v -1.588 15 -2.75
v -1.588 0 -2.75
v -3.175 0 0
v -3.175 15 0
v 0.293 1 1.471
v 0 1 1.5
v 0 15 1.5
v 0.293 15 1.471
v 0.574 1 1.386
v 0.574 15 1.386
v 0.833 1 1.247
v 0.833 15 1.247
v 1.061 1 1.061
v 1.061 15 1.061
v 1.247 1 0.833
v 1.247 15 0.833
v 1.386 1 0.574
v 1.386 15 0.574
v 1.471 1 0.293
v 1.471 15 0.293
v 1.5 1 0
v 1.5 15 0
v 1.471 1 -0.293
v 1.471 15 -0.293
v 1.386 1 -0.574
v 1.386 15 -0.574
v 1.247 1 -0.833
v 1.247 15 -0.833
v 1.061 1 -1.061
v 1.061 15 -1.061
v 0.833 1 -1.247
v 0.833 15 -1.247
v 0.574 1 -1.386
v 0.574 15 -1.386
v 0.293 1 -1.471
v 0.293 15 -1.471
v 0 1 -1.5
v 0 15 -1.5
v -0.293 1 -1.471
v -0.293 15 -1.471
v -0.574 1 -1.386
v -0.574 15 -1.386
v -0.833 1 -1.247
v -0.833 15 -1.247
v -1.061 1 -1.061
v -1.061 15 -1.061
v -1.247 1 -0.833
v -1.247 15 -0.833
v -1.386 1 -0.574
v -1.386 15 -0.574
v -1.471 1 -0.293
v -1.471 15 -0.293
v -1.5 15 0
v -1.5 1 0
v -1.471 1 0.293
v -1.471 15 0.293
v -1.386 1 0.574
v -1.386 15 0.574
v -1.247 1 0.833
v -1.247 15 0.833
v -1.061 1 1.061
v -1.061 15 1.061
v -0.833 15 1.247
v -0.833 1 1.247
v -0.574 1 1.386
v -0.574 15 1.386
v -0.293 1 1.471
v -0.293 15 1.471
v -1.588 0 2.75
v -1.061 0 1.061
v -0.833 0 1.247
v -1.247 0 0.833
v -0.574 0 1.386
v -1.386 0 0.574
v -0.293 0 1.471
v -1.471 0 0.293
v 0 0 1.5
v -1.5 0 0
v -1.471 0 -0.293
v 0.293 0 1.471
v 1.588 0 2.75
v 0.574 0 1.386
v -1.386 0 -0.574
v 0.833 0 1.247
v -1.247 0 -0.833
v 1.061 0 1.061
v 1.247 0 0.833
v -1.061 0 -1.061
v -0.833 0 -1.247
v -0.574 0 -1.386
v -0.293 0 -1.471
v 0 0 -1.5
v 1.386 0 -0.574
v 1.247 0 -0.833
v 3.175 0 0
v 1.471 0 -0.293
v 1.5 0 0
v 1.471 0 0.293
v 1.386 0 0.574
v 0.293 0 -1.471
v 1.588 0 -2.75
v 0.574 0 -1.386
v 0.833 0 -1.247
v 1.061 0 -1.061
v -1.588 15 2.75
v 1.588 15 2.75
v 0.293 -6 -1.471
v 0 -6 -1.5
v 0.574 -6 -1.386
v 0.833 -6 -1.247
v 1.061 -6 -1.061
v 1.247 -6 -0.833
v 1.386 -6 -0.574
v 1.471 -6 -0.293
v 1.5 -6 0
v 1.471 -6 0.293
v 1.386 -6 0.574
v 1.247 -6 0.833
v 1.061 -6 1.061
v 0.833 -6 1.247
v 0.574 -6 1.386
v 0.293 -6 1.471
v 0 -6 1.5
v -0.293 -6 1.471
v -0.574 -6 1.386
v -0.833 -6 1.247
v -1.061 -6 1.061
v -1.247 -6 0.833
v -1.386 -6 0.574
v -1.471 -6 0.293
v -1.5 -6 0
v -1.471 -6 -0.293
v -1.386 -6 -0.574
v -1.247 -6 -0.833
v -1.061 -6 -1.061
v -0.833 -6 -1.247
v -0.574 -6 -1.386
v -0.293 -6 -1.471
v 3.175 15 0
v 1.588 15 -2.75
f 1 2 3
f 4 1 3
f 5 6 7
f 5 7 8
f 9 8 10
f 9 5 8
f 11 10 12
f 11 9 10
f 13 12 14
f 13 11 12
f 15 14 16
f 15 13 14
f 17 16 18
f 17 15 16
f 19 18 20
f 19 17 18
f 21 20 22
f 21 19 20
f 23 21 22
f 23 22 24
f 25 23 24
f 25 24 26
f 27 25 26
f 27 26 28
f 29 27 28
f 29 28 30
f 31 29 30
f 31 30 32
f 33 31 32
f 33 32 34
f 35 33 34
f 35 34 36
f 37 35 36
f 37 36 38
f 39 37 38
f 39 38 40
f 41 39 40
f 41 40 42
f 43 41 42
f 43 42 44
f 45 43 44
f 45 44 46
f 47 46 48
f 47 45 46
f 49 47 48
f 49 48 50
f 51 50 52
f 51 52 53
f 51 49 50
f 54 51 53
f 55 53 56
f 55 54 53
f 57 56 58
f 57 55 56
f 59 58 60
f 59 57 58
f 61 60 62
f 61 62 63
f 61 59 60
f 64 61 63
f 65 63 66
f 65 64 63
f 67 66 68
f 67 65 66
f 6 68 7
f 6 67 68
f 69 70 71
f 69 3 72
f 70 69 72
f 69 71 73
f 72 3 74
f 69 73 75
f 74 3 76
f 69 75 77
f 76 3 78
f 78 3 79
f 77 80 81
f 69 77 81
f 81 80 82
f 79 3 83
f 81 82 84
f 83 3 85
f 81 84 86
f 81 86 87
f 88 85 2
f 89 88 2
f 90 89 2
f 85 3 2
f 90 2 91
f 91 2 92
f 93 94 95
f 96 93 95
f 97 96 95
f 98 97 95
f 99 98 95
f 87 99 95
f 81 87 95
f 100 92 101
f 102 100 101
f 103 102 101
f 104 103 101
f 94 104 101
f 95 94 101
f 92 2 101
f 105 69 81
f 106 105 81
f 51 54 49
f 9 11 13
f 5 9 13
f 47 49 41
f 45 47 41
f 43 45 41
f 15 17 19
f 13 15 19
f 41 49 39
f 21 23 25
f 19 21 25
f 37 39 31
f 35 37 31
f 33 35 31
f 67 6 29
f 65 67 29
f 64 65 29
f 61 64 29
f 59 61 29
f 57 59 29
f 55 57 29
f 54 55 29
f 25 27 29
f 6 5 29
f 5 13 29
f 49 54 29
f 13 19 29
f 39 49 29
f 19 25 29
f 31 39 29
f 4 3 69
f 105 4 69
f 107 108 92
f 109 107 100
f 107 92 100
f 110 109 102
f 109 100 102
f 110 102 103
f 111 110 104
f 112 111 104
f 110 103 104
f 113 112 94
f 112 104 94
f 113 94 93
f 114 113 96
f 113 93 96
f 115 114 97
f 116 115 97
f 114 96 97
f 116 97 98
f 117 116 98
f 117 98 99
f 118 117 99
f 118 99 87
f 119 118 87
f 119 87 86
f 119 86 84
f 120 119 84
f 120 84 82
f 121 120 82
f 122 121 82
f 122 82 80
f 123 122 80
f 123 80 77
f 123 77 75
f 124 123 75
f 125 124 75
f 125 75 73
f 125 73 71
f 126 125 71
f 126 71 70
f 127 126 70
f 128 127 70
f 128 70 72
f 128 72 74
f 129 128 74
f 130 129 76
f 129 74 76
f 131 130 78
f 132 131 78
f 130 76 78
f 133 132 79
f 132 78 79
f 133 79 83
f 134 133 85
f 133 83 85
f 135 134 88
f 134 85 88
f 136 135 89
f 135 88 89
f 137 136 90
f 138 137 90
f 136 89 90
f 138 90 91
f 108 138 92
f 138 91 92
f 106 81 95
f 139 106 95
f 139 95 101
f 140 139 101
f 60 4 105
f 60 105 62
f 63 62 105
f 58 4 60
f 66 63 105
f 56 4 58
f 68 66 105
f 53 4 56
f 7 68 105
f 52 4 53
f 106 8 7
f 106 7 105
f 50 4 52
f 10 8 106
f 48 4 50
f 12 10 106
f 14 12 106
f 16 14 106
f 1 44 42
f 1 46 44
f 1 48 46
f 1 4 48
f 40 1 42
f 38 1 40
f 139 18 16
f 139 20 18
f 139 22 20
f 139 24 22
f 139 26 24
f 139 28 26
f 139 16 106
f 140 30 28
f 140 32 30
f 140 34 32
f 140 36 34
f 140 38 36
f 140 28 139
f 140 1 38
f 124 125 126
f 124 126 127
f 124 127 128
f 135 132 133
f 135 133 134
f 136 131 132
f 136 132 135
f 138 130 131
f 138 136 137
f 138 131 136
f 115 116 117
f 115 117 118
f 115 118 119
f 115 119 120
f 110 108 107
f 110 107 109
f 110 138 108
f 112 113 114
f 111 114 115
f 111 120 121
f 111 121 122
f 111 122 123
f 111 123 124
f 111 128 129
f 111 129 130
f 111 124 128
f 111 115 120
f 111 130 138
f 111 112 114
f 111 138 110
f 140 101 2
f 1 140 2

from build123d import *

# Parameters (mm, degrees)
ESQUISSE1_R             = 1.5
BOSS_EXTRU_1_DEPTH      = 15
BOSS_EXTRU_2_DEPTH      = 6
BOSS_EXTRU_2_DEPTH_BACK = 1
ESQUISSE2_R             = 1.5


with BuildPart() as part:
    # Esquisse1 → Boss.-Extru.1 (new body)
    with BuildSketch(Plane(origin=(0, 0, 0), x_dir=(1, 0, 0), z_dir=(0, 1, 0))):
        Polygon((1.58771324, 2.75), (-1.58771324, 2.75), (-3.175426481, 0), (-1.58771324, -2.75), (1.58771324, -2.75), (3.175426481, 0), align=None)
        with Locations(Location((0, 0, 0), (0, 0, 270))):
            Circle(ESQUISSE1_R, mode=Mode.SUBTRACT)
    extrude(amount=BOSS_EXTRU_1_DEPTH)

    # Esquisse2 → Boss.-Extru.2 (add, two sides: drawn at the far end of the back side and taken through both)
    with BuildSketch(Plane.XZ.offset(-BOSS_EXTRU_2_DEPTH_BACK)):
        with Locations(Location((0, 0, 0), (0, 0, 270))):
            Circle(ESQUISSE2_R)
    extrude(amount=BOSS_EXTRU_2_DEPTH + BOSS_EXTRU_2_DEPTH_BACK)


solid = part.part
